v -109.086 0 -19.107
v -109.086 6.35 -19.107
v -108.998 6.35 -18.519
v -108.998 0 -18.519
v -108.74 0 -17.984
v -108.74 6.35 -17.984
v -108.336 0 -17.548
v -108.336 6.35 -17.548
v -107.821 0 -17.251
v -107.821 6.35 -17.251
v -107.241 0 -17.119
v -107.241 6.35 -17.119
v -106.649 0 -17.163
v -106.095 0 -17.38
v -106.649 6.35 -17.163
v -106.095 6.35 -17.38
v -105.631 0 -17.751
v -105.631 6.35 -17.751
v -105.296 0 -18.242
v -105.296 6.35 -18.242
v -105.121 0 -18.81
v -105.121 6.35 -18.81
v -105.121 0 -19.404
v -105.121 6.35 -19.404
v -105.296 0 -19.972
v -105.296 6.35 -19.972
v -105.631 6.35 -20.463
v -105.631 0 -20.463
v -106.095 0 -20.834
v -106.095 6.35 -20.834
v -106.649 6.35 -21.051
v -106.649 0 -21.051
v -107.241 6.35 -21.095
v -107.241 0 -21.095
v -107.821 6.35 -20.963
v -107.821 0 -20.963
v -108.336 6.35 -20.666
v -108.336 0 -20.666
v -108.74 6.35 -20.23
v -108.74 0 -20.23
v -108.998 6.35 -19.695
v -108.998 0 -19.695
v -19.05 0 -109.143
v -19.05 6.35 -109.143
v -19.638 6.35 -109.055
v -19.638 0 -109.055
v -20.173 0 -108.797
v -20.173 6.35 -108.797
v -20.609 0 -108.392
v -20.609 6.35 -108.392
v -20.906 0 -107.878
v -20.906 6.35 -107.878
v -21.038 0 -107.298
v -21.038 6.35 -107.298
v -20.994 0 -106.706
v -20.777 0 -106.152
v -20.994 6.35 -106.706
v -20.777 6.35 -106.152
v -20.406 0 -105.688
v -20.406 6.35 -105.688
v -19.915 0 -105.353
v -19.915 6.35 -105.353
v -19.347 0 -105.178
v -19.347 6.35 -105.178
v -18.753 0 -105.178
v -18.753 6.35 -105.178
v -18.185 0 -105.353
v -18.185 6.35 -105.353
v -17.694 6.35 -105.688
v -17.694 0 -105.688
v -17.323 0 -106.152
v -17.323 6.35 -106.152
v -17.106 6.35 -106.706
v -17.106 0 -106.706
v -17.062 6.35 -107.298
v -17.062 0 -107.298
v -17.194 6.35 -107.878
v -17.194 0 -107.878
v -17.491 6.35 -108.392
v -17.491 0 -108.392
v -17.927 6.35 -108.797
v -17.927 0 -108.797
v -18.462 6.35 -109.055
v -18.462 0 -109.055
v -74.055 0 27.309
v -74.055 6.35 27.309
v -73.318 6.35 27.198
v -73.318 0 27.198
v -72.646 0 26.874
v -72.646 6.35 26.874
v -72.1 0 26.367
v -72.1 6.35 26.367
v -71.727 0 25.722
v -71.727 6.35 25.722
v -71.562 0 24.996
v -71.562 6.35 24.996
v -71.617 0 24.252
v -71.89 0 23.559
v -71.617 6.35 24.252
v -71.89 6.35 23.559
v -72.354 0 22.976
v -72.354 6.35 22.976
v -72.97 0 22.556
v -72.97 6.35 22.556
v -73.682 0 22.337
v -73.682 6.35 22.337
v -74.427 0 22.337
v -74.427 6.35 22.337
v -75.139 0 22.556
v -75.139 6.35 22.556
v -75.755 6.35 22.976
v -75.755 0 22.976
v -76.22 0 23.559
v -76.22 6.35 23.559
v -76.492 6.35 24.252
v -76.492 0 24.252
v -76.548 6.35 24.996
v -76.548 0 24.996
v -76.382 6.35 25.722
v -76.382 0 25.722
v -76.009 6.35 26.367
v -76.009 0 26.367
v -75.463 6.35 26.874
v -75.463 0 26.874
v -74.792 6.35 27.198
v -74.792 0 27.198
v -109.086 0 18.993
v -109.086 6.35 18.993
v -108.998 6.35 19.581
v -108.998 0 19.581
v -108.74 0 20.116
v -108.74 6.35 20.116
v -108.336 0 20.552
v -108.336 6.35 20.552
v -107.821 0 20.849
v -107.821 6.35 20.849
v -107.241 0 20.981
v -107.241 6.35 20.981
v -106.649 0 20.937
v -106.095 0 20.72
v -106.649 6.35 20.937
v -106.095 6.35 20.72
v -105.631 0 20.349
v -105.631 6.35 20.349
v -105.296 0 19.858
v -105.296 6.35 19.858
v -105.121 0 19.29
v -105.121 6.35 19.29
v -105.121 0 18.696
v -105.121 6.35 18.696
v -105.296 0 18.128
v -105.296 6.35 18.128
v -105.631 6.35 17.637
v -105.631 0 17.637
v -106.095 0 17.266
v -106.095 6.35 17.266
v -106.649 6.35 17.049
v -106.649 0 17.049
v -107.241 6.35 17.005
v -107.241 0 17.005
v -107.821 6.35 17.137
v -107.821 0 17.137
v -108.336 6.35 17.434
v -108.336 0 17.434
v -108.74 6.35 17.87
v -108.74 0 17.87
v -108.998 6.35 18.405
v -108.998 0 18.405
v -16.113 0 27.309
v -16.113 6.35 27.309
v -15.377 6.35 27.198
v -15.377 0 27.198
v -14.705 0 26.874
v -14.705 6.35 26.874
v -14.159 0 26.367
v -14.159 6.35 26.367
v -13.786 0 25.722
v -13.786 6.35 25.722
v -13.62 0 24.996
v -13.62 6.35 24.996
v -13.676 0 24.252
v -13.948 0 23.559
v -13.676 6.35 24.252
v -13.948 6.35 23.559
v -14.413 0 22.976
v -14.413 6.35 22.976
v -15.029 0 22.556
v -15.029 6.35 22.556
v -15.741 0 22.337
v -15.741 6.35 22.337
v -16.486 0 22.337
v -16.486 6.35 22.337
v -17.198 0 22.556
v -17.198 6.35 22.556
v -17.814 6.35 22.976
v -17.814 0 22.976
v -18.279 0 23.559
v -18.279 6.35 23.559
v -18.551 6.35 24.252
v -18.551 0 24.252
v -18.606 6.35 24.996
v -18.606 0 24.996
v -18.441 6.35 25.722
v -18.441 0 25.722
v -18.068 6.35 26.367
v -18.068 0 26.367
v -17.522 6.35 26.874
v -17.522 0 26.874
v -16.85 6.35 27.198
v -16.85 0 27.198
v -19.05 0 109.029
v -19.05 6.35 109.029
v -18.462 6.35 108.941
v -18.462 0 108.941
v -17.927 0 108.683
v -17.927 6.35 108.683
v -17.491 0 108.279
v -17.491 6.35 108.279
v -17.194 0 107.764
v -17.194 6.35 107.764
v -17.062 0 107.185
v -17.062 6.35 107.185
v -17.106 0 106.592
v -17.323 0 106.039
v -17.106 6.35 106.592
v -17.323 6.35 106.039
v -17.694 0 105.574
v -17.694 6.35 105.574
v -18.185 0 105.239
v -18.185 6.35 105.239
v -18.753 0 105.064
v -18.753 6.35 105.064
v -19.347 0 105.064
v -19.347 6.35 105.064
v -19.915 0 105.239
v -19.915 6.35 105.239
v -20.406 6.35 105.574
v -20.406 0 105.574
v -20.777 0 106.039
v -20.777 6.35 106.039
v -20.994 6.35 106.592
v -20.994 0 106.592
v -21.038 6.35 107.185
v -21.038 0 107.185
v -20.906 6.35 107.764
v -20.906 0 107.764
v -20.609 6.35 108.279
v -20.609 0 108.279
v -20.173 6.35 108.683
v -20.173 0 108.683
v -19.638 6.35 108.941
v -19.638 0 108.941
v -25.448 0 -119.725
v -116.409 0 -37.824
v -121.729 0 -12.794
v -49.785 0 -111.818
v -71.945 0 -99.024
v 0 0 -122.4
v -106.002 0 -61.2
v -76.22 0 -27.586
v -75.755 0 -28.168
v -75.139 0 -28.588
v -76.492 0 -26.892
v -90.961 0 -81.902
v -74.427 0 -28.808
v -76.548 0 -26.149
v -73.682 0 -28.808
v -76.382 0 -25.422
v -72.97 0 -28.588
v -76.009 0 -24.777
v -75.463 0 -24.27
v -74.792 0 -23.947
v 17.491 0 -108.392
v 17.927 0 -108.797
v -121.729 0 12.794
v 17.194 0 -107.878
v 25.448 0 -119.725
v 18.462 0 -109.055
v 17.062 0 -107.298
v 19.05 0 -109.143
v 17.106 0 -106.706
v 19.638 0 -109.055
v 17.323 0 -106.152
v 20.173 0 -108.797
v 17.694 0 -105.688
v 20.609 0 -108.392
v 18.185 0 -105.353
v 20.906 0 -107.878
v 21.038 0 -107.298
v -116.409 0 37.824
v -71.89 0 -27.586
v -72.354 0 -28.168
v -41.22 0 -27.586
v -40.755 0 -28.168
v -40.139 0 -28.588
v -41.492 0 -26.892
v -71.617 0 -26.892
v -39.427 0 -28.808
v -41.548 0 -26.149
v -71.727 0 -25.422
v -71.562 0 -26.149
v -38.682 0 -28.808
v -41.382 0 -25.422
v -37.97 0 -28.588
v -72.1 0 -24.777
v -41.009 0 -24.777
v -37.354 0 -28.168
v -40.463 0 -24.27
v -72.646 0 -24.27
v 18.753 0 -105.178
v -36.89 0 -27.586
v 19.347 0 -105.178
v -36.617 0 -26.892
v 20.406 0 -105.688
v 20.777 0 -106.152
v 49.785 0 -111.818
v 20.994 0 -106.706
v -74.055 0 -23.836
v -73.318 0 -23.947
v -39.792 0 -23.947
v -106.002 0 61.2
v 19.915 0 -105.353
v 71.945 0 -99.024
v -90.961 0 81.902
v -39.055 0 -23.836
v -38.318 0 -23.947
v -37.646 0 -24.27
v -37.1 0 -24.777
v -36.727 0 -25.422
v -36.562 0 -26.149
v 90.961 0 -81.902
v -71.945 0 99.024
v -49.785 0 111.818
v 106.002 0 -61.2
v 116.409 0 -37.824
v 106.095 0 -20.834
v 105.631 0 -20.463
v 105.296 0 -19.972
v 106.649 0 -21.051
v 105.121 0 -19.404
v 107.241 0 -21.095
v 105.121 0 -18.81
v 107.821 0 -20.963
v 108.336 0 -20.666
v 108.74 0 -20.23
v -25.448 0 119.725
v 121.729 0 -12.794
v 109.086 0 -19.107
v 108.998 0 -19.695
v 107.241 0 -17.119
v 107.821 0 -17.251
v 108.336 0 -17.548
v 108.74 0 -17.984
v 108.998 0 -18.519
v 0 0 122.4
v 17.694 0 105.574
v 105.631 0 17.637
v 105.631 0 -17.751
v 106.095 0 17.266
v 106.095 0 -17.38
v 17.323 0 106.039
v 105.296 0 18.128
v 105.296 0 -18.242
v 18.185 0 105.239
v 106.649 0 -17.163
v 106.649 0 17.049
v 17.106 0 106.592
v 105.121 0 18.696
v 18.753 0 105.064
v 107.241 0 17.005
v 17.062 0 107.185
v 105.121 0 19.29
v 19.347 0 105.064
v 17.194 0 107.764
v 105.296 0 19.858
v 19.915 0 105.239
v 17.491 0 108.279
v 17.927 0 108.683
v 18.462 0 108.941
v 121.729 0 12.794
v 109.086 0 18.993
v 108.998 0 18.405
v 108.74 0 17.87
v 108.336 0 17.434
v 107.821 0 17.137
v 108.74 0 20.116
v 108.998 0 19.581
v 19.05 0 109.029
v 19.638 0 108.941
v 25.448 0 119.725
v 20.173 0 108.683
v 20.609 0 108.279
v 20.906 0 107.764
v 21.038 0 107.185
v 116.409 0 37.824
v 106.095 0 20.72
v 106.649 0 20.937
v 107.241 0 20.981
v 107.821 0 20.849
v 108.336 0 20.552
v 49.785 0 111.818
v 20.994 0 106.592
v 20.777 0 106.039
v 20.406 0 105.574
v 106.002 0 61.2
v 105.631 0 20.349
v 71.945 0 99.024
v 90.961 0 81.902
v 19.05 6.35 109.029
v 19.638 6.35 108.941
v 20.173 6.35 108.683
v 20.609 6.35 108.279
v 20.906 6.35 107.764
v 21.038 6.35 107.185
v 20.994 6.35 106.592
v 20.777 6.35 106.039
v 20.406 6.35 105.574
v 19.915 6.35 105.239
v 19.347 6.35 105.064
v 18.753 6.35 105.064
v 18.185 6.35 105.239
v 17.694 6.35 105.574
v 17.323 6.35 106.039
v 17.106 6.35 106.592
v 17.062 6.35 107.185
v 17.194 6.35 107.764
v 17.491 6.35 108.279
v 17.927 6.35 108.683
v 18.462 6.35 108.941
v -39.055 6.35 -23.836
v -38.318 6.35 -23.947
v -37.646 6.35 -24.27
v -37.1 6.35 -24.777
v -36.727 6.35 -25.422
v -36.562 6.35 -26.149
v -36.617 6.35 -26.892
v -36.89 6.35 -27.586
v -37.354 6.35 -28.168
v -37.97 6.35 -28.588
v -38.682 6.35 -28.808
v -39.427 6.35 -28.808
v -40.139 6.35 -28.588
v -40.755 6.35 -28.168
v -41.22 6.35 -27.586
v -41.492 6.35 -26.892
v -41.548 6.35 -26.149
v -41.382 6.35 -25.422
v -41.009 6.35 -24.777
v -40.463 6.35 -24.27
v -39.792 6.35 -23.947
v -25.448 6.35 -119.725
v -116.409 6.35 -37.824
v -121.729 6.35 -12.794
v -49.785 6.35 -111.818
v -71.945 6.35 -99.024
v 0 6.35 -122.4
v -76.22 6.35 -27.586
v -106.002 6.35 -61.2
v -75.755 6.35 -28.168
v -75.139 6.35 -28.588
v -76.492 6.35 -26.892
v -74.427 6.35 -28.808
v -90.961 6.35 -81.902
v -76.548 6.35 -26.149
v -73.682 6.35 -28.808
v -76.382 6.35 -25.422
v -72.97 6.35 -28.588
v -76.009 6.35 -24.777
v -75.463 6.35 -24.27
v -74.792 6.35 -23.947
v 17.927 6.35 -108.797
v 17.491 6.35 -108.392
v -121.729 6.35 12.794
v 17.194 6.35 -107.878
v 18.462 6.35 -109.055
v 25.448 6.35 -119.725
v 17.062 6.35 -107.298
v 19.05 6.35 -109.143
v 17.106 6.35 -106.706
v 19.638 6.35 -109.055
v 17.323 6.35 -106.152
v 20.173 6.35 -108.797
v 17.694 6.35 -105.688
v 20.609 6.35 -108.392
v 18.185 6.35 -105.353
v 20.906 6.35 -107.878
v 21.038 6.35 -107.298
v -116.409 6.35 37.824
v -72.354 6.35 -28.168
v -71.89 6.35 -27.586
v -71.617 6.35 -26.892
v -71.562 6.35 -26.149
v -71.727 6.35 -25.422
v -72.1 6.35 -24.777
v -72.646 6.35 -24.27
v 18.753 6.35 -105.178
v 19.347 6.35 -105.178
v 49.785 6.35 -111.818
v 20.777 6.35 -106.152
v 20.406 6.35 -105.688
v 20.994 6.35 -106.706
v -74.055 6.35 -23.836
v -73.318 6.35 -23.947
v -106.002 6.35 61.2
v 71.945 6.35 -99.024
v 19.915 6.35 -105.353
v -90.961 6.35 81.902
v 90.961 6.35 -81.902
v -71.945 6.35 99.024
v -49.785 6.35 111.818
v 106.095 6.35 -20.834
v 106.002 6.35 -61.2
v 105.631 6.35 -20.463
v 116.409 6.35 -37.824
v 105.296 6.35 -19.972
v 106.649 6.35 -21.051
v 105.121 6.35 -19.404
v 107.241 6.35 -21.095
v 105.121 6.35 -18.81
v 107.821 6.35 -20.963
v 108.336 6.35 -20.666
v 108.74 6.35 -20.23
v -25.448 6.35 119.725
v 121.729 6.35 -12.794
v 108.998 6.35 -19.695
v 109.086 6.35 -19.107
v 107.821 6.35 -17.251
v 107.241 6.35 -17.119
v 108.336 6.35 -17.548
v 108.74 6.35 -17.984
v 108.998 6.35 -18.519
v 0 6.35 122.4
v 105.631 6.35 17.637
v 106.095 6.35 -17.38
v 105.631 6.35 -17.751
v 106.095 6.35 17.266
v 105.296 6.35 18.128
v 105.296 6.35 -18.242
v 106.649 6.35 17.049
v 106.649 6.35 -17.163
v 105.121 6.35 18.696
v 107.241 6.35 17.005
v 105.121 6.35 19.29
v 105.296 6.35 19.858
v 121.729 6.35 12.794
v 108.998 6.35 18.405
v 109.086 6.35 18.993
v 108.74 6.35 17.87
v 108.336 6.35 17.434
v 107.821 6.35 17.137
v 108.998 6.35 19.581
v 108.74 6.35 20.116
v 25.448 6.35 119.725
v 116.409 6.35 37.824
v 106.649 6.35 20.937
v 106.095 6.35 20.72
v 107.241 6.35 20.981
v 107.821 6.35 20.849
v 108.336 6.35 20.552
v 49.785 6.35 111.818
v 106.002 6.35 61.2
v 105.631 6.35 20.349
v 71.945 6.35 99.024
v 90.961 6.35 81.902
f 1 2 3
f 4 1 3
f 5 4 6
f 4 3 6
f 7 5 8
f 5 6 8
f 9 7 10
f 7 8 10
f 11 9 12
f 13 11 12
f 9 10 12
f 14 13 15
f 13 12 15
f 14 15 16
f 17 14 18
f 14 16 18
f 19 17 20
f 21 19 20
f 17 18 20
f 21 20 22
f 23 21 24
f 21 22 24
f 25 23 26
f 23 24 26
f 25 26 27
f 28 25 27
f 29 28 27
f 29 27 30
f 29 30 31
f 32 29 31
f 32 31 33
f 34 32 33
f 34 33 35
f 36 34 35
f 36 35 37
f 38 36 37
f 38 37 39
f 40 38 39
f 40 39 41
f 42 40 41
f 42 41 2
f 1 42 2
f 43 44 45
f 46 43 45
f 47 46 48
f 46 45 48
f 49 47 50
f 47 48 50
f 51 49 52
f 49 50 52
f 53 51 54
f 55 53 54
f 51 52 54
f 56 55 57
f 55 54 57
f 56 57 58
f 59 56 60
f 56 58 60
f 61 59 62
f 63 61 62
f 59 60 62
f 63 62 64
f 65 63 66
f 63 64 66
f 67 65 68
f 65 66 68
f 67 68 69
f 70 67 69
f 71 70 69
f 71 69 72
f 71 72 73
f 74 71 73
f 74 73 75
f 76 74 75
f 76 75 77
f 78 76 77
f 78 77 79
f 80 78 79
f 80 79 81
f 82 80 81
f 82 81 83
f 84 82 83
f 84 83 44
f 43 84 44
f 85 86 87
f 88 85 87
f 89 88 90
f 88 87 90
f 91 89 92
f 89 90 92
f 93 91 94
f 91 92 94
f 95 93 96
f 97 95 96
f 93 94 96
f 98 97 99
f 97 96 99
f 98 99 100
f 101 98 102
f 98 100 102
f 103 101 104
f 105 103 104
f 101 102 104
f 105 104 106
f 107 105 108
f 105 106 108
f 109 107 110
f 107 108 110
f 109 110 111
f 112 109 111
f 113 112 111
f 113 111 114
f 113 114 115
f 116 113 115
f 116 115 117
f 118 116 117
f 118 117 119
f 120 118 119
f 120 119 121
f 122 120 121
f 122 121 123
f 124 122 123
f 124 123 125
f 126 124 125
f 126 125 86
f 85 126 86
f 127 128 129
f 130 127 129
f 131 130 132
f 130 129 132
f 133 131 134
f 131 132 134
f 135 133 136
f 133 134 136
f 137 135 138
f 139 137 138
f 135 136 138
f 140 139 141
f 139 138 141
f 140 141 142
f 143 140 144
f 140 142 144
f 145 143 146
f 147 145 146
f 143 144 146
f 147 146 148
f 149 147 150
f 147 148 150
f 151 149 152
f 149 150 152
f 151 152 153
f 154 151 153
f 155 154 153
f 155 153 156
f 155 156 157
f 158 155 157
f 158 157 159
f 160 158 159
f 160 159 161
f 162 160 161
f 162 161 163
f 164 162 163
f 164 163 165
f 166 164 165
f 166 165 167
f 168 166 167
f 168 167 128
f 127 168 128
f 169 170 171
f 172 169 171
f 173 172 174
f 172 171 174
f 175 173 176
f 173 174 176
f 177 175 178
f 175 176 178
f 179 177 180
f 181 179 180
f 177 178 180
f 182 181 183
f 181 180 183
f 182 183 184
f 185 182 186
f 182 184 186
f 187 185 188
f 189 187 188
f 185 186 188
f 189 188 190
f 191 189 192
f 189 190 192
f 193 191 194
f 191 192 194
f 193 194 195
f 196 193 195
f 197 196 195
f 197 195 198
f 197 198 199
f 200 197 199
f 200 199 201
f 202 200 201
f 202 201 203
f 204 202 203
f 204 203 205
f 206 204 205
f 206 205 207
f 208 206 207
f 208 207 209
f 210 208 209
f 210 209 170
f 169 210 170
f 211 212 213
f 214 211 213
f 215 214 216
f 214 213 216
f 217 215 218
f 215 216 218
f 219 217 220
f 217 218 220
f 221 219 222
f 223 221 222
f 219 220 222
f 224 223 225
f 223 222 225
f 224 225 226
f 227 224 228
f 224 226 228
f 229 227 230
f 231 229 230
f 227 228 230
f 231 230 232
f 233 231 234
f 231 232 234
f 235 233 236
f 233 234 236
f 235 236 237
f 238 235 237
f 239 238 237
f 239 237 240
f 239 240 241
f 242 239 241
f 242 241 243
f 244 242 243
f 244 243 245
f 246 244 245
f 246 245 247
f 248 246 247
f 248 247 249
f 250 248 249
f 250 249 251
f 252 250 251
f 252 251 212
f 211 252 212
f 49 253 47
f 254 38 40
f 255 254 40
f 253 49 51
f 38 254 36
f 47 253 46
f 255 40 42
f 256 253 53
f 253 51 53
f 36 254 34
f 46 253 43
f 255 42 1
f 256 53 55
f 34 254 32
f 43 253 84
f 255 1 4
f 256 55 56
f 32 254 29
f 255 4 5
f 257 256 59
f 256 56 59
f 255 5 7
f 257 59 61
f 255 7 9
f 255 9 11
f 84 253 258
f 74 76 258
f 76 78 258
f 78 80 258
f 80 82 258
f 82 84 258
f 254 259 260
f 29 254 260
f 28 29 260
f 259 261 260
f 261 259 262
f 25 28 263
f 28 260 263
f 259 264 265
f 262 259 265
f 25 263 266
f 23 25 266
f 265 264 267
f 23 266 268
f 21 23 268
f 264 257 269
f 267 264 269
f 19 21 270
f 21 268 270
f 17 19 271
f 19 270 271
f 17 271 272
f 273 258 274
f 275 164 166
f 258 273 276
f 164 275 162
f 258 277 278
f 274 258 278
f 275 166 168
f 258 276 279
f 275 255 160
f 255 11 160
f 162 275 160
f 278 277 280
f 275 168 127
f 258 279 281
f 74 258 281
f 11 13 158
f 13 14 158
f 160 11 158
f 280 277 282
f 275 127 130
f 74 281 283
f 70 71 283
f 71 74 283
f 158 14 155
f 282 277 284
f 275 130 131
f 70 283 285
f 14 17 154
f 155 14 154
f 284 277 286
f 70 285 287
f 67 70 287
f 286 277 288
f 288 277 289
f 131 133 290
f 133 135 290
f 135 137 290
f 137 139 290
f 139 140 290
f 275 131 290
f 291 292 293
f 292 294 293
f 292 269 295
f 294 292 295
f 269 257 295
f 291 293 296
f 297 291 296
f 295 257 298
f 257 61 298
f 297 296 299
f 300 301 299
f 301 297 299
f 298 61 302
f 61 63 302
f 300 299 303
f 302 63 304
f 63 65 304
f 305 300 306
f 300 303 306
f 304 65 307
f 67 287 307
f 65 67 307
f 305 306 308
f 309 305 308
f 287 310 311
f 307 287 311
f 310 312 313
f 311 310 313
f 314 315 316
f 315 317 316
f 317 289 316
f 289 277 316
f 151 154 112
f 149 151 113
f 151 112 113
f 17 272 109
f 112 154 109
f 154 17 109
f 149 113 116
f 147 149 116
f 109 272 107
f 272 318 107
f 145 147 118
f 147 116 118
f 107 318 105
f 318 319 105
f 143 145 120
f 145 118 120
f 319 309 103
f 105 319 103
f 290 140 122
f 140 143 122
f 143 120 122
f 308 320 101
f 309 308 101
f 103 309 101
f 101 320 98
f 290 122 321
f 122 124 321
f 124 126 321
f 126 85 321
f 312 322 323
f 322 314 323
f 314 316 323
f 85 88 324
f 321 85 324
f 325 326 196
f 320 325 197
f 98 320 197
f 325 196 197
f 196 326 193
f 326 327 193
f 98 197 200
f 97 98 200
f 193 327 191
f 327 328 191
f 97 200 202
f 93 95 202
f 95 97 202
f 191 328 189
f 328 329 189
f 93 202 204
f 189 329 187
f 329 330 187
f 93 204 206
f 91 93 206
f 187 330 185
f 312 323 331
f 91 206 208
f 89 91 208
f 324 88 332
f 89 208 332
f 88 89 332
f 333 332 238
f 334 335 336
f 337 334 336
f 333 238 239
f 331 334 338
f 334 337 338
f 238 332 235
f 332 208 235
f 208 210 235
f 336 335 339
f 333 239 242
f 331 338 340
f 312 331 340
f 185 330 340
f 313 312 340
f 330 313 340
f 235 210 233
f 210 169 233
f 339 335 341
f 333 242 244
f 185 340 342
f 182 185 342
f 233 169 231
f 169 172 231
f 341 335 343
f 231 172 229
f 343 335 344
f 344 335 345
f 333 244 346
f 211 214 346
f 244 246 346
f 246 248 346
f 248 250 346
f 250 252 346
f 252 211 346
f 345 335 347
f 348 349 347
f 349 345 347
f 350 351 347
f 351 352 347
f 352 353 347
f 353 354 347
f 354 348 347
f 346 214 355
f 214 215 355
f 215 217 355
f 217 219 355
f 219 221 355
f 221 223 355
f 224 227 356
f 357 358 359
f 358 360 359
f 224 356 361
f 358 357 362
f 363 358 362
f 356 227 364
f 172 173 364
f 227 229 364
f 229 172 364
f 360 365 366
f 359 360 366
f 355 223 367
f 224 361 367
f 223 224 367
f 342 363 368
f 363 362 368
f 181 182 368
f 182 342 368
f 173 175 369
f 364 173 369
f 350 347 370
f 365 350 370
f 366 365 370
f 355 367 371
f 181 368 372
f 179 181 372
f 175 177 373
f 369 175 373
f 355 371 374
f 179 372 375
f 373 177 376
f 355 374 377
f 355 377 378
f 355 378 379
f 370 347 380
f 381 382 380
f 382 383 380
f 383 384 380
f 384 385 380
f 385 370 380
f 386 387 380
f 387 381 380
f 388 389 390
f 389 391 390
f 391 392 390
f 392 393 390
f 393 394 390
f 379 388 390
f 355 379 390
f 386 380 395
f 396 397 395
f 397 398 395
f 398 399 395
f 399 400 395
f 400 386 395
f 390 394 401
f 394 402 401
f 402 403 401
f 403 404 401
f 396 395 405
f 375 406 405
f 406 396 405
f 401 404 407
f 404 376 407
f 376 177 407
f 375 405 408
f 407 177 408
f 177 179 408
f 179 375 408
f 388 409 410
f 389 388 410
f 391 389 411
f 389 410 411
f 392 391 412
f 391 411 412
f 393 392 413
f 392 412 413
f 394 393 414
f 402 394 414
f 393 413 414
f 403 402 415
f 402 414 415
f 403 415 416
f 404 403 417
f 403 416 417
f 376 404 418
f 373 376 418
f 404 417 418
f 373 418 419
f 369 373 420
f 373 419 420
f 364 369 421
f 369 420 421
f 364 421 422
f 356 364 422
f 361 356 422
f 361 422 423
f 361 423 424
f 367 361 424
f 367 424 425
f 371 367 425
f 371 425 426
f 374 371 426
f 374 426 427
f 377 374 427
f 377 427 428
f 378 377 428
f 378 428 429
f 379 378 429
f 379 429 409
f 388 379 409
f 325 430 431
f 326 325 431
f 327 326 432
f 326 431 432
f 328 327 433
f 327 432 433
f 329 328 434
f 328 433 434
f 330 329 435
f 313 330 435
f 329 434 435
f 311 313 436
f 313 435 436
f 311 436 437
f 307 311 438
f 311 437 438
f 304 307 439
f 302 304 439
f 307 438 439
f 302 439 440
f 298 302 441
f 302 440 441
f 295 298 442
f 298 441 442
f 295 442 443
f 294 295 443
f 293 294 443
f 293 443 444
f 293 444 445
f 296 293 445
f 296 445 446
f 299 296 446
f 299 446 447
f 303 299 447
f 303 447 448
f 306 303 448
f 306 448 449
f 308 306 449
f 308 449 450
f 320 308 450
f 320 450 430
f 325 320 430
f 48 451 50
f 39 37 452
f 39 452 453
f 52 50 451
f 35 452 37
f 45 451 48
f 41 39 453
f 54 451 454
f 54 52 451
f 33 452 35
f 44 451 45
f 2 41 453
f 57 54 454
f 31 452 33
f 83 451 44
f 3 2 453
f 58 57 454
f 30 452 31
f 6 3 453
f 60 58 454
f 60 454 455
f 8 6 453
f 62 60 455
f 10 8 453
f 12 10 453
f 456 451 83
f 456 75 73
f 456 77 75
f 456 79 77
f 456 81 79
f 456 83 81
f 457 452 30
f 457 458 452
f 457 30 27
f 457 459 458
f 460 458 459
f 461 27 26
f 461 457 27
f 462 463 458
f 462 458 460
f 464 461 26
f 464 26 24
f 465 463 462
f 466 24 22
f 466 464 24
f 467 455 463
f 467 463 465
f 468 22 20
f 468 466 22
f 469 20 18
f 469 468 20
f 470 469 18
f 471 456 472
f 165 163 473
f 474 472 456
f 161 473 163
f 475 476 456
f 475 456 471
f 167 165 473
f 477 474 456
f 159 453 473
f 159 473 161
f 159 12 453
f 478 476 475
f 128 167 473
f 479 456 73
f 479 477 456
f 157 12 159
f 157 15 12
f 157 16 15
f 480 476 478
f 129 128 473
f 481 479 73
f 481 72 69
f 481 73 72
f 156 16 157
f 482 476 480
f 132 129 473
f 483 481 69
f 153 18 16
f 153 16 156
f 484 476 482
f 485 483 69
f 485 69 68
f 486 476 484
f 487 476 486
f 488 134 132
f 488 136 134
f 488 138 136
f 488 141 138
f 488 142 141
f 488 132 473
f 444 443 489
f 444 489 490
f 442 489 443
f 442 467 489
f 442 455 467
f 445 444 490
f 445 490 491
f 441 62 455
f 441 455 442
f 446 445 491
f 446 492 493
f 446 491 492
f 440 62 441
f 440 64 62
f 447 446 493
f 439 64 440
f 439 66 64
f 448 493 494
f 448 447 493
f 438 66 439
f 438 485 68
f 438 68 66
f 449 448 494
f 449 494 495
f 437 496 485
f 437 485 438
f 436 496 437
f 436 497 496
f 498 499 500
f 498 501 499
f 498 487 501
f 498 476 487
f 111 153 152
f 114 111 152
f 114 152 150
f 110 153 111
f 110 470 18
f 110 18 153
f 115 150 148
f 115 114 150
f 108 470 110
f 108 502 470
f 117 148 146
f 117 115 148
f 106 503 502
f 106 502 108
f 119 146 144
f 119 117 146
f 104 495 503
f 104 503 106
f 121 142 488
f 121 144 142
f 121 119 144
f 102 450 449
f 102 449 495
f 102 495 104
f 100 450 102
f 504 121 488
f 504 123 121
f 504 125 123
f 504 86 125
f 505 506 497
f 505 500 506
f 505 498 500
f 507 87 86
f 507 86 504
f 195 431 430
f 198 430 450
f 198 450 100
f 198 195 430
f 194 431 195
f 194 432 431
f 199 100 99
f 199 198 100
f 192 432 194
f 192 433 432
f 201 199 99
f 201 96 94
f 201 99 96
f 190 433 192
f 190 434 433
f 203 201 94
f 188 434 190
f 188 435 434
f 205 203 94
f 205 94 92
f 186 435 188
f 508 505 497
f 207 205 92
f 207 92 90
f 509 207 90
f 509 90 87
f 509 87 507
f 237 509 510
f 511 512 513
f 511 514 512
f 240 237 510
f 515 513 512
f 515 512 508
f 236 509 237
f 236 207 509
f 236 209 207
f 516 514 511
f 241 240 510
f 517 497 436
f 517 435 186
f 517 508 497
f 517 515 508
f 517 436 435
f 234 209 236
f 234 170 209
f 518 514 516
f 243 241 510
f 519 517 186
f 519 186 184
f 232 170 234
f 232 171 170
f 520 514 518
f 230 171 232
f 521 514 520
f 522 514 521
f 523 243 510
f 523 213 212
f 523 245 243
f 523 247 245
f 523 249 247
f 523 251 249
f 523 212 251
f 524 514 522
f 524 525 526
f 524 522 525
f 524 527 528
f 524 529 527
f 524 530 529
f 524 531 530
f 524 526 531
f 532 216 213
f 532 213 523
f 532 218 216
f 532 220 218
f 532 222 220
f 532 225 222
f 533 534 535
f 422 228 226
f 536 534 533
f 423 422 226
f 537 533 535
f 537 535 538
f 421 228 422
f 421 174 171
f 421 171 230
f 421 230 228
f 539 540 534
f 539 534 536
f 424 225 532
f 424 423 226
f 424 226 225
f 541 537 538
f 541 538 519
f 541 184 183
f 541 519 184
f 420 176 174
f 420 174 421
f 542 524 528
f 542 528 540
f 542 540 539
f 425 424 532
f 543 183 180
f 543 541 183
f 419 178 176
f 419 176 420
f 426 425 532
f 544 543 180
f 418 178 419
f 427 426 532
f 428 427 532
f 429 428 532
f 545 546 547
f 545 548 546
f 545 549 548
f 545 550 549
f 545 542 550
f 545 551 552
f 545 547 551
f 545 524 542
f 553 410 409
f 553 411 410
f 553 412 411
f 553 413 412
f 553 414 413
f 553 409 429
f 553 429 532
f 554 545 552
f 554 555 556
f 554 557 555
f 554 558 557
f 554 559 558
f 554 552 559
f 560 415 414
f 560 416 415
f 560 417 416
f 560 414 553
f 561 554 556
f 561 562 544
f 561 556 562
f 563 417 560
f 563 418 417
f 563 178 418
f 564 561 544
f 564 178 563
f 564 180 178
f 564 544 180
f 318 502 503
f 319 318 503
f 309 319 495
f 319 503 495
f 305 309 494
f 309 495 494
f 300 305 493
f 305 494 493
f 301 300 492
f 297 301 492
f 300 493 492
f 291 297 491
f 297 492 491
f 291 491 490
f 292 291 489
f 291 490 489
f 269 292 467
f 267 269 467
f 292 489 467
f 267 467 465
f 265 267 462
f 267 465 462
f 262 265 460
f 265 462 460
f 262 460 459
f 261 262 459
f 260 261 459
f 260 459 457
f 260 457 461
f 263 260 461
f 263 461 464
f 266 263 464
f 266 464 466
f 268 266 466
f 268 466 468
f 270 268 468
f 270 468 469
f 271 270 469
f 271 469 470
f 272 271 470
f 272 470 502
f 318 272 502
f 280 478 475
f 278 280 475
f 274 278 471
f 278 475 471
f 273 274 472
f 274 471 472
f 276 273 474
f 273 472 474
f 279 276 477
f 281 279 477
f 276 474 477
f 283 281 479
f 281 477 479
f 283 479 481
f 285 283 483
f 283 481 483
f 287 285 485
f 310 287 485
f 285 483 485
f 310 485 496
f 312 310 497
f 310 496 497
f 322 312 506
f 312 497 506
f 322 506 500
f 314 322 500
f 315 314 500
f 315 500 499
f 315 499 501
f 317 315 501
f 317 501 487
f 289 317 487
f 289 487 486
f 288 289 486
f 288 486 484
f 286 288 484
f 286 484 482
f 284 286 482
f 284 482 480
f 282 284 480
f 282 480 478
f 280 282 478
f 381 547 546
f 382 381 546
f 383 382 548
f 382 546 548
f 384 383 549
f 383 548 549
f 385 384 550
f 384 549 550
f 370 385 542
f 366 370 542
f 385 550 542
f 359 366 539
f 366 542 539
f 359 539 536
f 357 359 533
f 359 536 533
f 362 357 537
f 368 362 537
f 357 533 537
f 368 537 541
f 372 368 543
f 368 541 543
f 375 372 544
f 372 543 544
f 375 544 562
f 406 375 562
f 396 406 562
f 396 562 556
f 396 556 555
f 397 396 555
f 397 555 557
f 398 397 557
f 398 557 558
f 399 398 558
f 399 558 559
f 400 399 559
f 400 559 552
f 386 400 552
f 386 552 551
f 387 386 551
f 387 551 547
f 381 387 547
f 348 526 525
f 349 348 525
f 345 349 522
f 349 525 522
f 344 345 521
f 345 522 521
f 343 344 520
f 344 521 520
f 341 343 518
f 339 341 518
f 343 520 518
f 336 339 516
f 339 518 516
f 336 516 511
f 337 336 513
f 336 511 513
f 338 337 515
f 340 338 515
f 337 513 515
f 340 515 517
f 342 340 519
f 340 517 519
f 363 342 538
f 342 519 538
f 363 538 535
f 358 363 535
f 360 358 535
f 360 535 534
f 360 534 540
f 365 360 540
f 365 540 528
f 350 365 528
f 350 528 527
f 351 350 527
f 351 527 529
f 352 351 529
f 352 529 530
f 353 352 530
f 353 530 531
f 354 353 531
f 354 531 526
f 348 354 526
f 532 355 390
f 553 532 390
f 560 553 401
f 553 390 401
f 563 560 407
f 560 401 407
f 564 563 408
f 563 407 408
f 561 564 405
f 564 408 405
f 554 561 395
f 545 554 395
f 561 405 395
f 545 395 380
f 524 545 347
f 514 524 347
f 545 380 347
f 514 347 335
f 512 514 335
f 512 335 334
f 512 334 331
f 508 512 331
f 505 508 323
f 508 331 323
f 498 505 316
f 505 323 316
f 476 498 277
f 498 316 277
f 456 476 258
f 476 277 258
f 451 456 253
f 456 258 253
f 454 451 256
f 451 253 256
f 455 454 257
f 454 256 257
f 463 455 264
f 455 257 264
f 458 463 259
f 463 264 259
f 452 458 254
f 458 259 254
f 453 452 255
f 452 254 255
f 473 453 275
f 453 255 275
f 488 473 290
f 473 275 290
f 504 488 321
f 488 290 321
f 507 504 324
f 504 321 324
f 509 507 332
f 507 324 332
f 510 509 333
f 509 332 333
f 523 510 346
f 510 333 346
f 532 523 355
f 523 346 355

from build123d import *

# Parameters (mm, degrees)
SKETCH1_R           = 122.4
BOSS_EXTRUDE1_DEPTH = 6.35
SKETCH2_R           = 1.9939
CUT_EXTRUDE1_DEPTH  = 174.216172744
CIRPATTERN1_COUNT   = 4
SKETCH3_R           = 2.5
CUT_EXTRUDE3_DEPTH  = 174.216172744


with BuildPart() as part:
    # Sketch1 → Boss-Extrude1 (new body)
    with BuildSketch(Plane(origin=(0, 0, 0), x_dir=(1, 0, 0), z_dir=(0, 1, 0))):
        with Locations(Location((0, 0, 0), (0, 0, 270))):
            Circle(SKETCH1_R)
    extrude(amount=BOSS_EXTRUDE1_DEPTH)

    # Sketch2 → Cut-Extrude1 (cut, through all)
    with BuildSketch(Plane(origin=(0, 6.35, 0), x_dir=(1, 0, 0), z_dir=(0, 1, 0))):
        with Locations(Location((-19.05, -107.035541925, 0), (0, 0, 270))):
            Circle(SKETCH2_R)
        with Locations(Location((19.05, -107.035541925, 0), (0, 0, 270))):
            Circle(SKETCH2_R)
    cut_extrude1 = extrude(amount=-CUT_EXTRUDE1_DEPTH, mode=Mode.SUBTRACT)

    # CirPattern1: Cut-Extrude1 ×4 about axis
    cirpattern1_axis = Axis((0, 0, -0.056837174), (0, 1, 0))
    for i in range(1, CIRPATTERN1_COUNT):
        add(cut_extrude1.rotate(cirpattern1_axis, i * 360 / CIRPATTERN1_COUNT), mode=Mode.SUBTRACT)

    # Sketch3 → Cut-Extrude3 (cut, through all)
    with BuildSketch(Plane(origin=(0, 6.35, 0), x_dir=(1, 0, 0), z_dir=(0, 1, 0))):
        with Locations(Location((-74.054631747, 26.335816411, 0), (0, 0, 270))):
            Circle(SKETCH3_R)
        with Locations(Location((-39.054631747, 26.335816411, 0), (0, 0, 270))):
            Circle(SKETCH3_R)
        with Locations(Location((-16.113436886, -24.808749019, 0), (0, 0, 270))):
            Circle(SKETCH3_R)
        with Locations(Location((-74.054631747, -24.808749019, 0), (0, 0, 270))):
            Circle(SKETCH3_R)
    extrude(amount=-CUT_EXTRUDE3_DEPTH, mode=Mode.SUBTRACT)


solid = part.part
